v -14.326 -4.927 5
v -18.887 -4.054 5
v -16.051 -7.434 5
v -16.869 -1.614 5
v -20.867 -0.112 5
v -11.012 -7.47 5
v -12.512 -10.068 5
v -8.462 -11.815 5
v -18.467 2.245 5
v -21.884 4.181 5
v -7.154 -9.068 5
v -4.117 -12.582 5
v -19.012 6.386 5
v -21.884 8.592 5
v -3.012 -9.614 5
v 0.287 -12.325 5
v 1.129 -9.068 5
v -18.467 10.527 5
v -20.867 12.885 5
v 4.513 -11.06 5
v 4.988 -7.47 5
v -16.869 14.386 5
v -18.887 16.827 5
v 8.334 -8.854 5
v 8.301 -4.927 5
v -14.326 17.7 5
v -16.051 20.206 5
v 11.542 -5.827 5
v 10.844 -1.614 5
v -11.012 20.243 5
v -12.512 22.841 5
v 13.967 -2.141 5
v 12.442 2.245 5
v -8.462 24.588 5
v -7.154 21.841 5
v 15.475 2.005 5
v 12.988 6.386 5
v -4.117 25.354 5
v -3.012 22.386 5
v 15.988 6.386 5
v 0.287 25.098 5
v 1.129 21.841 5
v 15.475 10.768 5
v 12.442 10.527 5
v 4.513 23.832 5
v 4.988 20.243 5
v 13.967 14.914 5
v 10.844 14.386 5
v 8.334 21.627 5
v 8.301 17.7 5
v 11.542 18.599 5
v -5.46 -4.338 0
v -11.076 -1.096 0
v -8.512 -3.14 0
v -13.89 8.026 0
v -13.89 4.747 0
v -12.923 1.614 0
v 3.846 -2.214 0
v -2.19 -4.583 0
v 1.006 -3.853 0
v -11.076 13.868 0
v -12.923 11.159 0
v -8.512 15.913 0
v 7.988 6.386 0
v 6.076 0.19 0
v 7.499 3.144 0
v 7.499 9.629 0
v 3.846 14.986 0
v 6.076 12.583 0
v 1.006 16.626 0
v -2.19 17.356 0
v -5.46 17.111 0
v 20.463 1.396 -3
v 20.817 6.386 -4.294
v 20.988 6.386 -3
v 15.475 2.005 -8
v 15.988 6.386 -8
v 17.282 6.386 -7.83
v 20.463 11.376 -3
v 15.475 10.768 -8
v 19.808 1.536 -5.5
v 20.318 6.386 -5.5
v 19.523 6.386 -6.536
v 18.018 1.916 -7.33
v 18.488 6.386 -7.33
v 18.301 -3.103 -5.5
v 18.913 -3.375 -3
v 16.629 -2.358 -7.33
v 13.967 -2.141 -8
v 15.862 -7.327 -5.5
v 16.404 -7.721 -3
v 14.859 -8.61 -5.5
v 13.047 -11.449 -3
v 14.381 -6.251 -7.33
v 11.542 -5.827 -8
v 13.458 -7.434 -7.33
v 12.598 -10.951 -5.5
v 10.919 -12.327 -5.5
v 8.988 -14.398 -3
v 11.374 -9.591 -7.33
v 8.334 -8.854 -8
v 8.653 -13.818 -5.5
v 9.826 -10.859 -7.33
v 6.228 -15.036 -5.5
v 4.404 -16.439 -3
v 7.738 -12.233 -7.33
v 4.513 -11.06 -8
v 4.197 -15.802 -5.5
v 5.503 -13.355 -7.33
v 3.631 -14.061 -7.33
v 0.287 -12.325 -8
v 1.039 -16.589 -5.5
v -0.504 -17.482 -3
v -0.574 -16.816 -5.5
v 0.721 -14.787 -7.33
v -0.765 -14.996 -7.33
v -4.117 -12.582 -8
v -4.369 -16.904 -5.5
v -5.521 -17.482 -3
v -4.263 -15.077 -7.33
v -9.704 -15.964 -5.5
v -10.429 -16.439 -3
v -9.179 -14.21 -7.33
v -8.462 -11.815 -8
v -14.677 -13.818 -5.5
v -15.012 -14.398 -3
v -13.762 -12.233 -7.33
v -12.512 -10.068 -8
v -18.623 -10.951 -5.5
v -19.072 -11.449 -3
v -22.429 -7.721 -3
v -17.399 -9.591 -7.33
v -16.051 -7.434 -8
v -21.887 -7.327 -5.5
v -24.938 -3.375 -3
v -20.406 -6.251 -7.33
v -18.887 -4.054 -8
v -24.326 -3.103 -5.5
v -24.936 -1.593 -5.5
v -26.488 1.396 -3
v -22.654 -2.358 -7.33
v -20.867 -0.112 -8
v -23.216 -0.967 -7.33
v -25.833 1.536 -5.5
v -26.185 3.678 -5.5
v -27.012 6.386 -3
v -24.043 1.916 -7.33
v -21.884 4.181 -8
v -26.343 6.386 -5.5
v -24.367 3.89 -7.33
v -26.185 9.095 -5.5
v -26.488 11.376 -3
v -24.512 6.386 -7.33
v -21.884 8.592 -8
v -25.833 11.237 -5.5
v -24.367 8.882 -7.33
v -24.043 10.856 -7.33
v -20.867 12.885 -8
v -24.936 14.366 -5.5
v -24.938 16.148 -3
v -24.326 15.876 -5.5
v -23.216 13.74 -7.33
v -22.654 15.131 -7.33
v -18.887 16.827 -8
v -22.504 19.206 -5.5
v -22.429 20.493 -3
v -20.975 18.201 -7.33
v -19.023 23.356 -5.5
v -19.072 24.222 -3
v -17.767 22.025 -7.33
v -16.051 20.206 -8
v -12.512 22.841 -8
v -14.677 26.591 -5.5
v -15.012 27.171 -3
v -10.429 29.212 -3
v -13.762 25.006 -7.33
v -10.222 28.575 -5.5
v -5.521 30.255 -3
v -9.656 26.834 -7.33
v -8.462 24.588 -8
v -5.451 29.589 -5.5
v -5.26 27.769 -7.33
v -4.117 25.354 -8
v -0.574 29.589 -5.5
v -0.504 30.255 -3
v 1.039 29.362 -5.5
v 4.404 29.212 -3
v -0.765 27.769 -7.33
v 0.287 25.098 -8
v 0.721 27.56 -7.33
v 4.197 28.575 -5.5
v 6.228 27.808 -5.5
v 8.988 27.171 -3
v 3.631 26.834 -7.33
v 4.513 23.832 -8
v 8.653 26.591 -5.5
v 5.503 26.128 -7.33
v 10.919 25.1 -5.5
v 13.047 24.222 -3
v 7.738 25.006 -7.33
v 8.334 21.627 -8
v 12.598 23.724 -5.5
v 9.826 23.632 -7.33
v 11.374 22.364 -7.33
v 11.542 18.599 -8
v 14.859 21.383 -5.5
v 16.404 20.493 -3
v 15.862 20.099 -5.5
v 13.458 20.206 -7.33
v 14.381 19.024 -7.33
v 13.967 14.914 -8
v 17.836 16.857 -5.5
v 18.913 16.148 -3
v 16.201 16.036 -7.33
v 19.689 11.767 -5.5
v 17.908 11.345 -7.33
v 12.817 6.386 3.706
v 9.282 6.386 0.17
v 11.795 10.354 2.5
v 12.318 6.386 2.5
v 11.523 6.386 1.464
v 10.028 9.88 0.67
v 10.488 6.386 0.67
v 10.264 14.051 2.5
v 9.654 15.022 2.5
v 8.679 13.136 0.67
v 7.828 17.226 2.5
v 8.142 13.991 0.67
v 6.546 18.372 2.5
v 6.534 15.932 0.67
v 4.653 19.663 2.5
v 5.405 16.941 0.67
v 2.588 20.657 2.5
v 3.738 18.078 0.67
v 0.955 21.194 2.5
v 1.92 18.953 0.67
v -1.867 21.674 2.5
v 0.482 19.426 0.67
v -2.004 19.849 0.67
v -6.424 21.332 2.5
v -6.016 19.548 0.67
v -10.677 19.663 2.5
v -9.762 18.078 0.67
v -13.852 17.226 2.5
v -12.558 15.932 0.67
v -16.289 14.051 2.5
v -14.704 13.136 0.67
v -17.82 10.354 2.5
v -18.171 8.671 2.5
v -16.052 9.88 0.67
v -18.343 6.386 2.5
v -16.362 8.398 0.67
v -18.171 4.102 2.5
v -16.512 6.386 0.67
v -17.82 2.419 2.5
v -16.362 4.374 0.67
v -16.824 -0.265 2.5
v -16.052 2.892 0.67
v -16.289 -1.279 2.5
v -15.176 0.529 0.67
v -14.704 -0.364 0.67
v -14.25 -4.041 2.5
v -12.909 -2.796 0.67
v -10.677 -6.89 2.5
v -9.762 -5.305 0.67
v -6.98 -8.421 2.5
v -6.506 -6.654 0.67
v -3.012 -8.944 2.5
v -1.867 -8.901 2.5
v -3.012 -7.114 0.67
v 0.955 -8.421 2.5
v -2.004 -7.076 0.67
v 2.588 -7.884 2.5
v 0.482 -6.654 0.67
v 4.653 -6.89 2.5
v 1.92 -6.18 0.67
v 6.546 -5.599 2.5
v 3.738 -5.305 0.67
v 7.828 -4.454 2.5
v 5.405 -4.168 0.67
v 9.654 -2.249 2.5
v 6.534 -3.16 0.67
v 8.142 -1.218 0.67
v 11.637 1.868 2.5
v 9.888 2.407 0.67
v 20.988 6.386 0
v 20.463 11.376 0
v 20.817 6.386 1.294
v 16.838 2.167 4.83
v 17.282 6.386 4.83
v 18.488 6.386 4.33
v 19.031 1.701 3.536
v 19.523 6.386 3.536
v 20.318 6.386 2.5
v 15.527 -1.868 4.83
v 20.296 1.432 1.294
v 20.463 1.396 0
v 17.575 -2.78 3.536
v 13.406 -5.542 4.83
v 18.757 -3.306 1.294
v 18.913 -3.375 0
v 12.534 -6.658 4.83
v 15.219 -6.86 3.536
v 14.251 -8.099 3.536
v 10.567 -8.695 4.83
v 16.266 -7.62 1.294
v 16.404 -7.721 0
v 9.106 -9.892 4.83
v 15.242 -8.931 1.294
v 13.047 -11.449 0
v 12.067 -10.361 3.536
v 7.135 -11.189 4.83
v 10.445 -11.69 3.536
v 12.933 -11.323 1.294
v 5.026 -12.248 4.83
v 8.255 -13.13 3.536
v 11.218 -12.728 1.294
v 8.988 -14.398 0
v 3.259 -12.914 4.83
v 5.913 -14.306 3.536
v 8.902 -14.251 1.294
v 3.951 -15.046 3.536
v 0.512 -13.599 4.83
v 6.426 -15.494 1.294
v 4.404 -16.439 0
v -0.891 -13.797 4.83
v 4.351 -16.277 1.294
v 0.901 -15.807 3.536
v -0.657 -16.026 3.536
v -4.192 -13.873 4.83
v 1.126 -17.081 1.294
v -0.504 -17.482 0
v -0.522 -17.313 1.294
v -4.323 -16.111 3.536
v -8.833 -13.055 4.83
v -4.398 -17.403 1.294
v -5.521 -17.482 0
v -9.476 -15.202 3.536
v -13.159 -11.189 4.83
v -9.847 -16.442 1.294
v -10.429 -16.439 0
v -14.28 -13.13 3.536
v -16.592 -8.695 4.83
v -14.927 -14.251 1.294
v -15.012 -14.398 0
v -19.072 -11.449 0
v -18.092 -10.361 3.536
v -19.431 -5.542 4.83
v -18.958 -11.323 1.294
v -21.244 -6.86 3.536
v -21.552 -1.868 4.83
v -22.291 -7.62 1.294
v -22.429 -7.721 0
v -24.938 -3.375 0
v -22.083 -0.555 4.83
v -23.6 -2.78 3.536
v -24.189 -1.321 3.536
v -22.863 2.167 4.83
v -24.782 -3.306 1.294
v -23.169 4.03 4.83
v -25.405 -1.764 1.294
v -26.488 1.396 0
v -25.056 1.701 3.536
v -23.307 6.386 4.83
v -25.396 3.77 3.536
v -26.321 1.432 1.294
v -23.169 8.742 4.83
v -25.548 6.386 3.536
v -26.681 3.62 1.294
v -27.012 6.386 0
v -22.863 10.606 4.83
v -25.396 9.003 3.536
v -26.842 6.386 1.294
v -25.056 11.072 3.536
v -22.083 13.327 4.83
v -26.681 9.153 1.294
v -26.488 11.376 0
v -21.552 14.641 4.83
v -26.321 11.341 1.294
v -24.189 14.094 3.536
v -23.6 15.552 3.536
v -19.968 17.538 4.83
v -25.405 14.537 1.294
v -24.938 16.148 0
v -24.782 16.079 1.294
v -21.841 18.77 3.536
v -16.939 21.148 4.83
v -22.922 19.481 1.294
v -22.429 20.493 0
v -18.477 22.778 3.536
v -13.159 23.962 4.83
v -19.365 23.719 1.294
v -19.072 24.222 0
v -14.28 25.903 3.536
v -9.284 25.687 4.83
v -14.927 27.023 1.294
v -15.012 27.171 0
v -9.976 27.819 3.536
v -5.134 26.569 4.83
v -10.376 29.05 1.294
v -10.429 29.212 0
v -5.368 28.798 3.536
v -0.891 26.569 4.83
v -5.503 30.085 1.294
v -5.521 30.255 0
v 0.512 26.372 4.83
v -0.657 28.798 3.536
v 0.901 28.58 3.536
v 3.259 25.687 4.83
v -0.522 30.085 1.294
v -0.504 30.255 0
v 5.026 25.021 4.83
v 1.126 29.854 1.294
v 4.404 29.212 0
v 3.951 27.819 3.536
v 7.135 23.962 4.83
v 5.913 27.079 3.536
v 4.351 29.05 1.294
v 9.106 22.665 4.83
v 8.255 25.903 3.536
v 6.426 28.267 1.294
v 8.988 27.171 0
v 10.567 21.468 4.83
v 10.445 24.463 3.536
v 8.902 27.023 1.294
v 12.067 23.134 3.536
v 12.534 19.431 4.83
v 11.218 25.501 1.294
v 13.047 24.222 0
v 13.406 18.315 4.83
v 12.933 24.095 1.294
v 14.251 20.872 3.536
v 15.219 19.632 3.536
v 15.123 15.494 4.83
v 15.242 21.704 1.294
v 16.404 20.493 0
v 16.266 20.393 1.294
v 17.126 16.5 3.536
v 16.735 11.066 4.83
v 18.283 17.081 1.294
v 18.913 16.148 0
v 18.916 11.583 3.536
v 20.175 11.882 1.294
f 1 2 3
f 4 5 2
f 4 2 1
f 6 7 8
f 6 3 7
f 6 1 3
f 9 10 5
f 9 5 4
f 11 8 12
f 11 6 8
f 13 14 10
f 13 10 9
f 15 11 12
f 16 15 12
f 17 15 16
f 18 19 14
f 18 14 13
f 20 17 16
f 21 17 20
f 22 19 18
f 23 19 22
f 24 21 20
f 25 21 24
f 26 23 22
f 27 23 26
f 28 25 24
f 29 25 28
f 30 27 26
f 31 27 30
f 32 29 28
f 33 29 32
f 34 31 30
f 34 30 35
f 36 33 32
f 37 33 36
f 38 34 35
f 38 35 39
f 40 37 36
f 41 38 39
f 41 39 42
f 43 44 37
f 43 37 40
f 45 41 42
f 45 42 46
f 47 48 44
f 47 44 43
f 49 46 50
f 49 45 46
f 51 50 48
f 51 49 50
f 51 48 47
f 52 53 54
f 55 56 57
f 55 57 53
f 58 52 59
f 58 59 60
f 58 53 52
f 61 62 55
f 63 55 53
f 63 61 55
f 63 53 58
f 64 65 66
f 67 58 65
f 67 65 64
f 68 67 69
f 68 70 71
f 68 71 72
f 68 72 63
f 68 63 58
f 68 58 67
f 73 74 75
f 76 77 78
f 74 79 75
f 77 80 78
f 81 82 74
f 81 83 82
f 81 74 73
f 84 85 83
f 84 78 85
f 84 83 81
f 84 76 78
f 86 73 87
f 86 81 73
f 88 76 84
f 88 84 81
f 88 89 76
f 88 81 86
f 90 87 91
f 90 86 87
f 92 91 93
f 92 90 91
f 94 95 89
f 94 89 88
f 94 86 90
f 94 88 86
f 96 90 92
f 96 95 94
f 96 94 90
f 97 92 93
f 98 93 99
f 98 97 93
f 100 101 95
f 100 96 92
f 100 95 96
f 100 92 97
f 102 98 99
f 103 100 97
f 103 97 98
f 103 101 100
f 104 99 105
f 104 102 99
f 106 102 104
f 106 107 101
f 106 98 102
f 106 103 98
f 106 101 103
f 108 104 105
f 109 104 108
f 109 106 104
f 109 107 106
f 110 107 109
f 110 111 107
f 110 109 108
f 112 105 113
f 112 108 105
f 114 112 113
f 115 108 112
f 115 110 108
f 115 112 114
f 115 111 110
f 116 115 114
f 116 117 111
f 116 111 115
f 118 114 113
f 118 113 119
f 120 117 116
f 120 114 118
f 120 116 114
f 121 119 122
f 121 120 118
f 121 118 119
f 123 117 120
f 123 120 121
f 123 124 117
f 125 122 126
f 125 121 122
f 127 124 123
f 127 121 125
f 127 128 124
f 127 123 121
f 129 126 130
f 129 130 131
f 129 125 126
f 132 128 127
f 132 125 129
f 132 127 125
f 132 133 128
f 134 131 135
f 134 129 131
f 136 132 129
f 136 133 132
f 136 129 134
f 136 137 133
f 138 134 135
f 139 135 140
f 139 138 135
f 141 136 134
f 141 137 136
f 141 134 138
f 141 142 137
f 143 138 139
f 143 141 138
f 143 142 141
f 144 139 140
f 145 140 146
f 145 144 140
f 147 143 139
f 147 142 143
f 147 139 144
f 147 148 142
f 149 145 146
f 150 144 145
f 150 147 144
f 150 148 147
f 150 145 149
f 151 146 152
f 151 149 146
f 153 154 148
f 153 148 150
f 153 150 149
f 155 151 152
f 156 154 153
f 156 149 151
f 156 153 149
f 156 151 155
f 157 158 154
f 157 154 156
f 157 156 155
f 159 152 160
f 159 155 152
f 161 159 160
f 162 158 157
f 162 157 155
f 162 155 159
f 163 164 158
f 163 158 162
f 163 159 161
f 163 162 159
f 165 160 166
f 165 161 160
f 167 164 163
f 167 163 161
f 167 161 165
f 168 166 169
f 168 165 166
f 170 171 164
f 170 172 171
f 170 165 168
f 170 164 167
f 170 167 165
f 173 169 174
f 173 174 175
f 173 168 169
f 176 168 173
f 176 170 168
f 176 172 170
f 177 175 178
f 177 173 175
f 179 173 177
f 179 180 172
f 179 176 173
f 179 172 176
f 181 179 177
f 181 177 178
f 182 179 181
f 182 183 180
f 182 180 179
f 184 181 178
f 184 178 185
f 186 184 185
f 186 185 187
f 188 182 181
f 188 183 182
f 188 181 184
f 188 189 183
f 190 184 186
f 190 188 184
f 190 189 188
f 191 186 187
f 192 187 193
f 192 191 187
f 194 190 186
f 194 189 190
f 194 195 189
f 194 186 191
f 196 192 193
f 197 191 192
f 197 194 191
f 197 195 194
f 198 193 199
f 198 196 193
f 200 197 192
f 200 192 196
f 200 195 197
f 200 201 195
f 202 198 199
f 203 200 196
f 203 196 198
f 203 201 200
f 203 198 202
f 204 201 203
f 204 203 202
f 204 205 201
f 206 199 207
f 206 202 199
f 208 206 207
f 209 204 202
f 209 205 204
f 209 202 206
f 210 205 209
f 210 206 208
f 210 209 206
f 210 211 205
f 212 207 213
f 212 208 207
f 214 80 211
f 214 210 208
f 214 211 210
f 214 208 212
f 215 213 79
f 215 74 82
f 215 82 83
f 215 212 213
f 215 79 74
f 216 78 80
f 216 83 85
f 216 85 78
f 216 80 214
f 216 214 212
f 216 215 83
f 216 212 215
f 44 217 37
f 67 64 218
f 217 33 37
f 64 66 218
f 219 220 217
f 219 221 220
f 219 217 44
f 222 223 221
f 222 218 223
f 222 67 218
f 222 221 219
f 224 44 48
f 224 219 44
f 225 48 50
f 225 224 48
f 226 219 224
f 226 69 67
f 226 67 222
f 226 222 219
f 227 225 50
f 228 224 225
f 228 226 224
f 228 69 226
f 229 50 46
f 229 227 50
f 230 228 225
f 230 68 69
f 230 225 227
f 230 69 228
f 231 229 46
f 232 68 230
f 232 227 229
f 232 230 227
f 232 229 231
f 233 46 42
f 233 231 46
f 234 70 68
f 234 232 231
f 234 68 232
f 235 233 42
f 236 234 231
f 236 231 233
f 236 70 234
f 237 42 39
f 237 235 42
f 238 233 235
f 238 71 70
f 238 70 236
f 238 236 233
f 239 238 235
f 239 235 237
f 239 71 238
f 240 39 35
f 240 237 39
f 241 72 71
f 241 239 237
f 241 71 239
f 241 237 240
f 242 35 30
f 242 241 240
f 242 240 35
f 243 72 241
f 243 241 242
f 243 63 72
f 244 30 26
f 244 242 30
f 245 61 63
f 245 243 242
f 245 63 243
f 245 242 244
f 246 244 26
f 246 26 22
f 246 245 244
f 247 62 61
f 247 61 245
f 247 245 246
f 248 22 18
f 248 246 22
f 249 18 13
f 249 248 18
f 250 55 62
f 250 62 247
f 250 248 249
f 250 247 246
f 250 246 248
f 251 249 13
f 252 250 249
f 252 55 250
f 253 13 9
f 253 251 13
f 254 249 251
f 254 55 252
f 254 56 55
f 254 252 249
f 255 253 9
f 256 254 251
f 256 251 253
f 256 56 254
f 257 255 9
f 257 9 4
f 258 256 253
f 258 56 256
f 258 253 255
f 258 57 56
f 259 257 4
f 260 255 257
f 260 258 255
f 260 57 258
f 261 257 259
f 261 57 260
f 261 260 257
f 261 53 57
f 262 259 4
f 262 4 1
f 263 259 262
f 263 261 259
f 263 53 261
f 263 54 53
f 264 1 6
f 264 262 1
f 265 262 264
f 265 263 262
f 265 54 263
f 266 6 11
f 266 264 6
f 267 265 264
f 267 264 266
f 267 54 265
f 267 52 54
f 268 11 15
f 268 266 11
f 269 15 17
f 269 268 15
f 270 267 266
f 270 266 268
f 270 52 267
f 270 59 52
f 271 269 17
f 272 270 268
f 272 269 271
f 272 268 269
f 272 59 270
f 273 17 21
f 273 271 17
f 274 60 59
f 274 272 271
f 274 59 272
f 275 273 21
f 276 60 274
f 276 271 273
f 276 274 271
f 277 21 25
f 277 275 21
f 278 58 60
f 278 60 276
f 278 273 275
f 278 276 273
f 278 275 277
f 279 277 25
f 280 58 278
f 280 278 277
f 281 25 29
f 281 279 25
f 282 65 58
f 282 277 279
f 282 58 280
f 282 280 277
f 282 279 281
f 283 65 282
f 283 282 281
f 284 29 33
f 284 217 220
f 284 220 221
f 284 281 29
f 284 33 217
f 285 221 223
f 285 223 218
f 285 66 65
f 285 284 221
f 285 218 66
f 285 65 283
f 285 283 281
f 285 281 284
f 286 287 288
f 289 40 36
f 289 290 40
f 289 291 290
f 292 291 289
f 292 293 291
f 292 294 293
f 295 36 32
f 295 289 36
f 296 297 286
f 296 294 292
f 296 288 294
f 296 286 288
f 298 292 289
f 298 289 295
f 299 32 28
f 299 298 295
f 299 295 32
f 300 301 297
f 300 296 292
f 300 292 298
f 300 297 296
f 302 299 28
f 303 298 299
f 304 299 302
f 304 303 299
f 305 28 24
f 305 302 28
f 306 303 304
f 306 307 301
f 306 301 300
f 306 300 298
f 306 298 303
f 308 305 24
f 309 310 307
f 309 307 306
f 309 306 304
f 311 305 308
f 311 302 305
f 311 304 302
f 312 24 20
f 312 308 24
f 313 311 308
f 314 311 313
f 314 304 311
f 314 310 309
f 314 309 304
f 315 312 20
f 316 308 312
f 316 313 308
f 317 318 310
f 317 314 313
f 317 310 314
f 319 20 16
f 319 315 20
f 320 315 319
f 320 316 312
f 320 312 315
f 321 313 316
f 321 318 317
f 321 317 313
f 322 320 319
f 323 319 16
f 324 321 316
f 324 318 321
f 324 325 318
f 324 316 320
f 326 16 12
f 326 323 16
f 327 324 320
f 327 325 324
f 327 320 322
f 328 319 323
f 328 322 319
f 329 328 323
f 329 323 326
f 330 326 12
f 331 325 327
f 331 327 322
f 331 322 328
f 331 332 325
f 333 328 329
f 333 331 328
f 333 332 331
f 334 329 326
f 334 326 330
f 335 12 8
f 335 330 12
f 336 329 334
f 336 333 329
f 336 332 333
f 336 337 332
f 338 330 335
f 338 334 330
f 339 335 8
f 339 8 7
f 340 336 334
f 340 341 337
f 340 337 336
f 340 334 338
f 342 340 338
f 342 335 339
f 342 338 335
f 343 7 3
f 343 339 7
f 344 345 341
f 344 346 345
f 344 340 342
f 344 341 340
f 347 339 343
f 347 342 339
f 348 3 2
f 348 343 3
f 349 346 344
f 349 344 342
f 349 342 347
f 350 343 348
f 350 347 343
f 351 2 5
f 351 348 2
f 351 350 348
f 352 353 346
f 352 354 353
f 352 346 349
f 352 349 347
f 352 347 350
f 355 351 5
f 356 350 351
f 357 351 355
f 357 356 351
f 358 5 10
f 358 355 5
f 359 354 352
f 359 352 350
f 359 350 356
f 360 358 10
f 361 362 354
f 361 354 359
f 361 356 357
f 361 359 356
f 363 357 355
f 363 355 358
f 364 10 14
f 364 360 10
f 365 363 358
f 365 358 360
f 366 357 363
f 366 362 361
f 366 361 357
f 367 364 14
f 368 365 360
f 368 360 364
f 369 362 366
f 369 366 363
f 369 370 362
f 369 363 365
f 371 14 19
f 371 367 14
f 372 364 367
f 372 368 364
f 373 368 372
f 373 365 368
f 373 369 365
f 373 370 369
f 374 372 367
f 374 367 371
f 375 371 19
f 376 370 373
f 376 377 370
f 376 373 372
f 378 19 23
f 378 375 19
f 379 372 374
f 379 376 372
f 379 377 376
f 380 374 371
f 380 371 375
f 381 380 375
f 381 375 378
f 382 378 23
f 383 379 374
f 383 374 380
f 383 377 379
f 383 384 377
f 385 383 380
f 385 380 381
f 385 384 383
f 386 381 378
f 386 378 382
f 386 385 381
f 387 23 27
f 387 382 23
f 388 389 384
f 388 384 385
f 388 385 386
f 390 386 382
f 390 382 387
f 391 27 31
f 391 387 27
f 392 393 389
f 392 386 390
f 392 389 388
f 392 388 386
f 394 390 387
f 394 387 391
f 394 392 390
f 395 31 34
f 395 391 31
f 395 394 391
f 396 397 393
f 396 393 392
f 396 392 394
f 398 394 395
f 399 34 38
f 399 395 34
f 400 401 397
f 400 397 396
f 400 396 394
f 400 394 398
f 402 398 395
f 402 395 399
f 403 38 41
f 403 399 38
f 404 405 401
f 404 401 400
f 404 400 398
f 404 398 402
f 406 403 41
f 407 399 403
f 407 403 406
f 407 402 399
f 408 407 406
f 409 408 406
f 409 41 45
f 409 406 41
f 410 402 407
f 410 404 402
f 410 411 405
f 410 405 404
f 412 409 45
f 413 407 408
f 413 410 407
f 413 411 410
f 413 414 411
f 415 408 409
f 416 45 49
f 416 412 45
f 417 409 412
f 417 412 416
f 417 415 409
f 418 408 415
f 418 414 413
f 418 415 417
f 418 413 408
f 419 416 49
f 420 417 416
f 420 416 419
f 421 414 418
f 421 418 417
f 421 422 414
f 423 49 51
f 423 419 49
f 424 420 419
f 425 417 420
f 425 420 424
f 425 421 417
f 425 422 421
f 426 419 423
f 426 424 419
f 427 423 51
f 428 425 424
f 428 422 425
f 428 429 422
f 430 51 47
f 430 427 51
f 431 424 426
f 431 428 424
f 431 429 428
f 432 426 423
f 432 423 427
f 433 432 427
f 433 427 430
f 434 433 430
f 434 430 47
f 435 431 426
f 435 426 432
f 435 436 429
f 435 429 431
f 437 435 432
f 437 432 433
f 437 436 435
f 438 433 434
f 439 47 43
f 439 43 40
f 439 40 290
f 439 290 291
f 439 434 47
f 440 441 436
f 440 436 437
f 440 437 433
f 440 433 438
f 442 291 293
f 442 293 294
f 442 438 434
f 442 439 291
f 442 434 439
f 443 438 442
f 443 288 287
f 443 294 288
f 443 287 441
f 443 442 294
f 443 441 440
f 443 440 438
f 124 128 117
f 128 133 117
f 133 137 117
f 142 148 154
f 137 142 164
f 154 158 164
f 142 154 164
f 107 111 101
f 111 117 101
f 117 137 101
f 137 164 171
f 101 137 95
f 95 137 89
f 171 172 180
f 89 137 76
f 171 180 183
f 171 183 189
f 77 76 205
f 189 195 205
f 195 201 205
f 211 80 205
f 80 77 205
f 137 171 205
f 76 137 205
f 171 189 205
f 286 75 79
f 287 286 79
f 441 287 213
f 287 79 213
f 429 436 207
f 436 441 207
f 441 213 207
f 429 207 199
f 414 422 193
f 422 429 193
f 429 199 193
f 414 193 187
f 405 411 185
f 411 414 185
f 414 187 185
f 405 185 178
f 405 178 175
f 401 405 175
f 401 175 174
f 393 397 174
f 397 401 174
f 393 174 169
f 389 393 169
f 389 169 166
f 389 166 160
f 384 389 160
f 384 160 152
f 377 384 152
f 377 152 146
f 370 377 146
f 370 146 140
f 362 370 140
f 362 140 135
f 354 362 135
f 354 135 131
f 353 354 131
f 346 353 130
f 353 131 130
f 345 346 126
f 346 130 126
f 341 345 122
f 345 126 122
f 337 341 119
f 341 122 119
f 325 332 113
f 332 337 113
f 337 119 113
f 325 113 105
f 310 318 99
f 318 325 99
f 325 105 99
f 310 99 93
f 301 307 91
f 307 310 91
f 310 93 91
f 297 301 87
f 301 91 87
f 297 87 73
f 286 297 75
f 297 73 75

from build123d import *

# Parameters (mm, degrees)
F0_R     = 16
F1_DEPTH = 5
F2_T     = 8


# Not quite as in the source:
# - a fillet or chamfer that OpenCascade refuses, or shapes differently, is made with other operations: its cross-section is extruded or revolved along the edge and cut away or added
# - two fillets or chamfers of one size are made in one step
# - a feature of the source that left no trace in its solid (it failed there, or was rolled back) is left out


with BuildPart() as f1:
    # F0 (on Top) → F1 (new body)
    with BuildSketch(Plane.XY):
        with Locations((-3.0124252662, 6.3863405958)):
            Circle(F0_R)
    extrude(amount=F1_DEPTH)

    # F2
    f2_openings = [f1.faces().sort_by_distance(p)[0] for p in [
        (-3.012425, 6.386341, 5),
    ]]
    offset(amount=F2_T, openings=f2_openings, kind=Kind.INTERSECTION)

    # F3: fillet of radius 5 on 3 edges, made by hand

    # F3_s1 → F3_t2 (revolve)
    with BuildSketch(Plane.XZ.offset(-6.3863405958)):
        with BuildLine():
            ThreePointArc((12.9875747338, 5), (11.5231086397, 1.4644660941), (7.9875747338, 0))
            Line((7.9875747338, 0), (12.9875747338, 0))
            Line((12.9875747338, 0), (12.9875747338, 5))
        make_face()
    revolve(axis=Axis((-3.0124252662, 6.3863405958, 0), (0, 0, 1)))

    # F3_s3 → F3_t4 (revolve, cut)
    with BuildSketch(Plane.XZ.offset(-6.3863405958)):
        with BuildLine():
            ThreePointArc((15.9875747338, 5), (19.5231086397, 3.5355339059), (20.9875747338, 0))
            Line((20.9875747338, 0), (20.9875747338, 5))
            Line((20.9875747338, 5), (15.9875747338, 5))
        make_face()
    revolve(axis=Axis((-3.0124252662, 6.3863405958, 5), (0, 0, -1)), mode=Mode.SUBTRACT)

    # F3_s5 → F3_t6 (revolve, cut)
    with BuildSketch(Plane.XZ.offset(-6.3863405958)):
        with BuildLine():
            ThreePointArc((20.9875747338, -3), (19.5231086397, -6.5355339059), (15.9875747338, -8))
            Line((15.9875747338, -8), (20.9875747338, -8))
            Line((20.9875747338, -8), (20.9875747338, -3))
        make_face()
    revolve(axis=Axis((-3.0124252662, 6.3863405958, -8), (0, 0, -1)), mode=Mode.SUBTRACT)


solid = f1.part
